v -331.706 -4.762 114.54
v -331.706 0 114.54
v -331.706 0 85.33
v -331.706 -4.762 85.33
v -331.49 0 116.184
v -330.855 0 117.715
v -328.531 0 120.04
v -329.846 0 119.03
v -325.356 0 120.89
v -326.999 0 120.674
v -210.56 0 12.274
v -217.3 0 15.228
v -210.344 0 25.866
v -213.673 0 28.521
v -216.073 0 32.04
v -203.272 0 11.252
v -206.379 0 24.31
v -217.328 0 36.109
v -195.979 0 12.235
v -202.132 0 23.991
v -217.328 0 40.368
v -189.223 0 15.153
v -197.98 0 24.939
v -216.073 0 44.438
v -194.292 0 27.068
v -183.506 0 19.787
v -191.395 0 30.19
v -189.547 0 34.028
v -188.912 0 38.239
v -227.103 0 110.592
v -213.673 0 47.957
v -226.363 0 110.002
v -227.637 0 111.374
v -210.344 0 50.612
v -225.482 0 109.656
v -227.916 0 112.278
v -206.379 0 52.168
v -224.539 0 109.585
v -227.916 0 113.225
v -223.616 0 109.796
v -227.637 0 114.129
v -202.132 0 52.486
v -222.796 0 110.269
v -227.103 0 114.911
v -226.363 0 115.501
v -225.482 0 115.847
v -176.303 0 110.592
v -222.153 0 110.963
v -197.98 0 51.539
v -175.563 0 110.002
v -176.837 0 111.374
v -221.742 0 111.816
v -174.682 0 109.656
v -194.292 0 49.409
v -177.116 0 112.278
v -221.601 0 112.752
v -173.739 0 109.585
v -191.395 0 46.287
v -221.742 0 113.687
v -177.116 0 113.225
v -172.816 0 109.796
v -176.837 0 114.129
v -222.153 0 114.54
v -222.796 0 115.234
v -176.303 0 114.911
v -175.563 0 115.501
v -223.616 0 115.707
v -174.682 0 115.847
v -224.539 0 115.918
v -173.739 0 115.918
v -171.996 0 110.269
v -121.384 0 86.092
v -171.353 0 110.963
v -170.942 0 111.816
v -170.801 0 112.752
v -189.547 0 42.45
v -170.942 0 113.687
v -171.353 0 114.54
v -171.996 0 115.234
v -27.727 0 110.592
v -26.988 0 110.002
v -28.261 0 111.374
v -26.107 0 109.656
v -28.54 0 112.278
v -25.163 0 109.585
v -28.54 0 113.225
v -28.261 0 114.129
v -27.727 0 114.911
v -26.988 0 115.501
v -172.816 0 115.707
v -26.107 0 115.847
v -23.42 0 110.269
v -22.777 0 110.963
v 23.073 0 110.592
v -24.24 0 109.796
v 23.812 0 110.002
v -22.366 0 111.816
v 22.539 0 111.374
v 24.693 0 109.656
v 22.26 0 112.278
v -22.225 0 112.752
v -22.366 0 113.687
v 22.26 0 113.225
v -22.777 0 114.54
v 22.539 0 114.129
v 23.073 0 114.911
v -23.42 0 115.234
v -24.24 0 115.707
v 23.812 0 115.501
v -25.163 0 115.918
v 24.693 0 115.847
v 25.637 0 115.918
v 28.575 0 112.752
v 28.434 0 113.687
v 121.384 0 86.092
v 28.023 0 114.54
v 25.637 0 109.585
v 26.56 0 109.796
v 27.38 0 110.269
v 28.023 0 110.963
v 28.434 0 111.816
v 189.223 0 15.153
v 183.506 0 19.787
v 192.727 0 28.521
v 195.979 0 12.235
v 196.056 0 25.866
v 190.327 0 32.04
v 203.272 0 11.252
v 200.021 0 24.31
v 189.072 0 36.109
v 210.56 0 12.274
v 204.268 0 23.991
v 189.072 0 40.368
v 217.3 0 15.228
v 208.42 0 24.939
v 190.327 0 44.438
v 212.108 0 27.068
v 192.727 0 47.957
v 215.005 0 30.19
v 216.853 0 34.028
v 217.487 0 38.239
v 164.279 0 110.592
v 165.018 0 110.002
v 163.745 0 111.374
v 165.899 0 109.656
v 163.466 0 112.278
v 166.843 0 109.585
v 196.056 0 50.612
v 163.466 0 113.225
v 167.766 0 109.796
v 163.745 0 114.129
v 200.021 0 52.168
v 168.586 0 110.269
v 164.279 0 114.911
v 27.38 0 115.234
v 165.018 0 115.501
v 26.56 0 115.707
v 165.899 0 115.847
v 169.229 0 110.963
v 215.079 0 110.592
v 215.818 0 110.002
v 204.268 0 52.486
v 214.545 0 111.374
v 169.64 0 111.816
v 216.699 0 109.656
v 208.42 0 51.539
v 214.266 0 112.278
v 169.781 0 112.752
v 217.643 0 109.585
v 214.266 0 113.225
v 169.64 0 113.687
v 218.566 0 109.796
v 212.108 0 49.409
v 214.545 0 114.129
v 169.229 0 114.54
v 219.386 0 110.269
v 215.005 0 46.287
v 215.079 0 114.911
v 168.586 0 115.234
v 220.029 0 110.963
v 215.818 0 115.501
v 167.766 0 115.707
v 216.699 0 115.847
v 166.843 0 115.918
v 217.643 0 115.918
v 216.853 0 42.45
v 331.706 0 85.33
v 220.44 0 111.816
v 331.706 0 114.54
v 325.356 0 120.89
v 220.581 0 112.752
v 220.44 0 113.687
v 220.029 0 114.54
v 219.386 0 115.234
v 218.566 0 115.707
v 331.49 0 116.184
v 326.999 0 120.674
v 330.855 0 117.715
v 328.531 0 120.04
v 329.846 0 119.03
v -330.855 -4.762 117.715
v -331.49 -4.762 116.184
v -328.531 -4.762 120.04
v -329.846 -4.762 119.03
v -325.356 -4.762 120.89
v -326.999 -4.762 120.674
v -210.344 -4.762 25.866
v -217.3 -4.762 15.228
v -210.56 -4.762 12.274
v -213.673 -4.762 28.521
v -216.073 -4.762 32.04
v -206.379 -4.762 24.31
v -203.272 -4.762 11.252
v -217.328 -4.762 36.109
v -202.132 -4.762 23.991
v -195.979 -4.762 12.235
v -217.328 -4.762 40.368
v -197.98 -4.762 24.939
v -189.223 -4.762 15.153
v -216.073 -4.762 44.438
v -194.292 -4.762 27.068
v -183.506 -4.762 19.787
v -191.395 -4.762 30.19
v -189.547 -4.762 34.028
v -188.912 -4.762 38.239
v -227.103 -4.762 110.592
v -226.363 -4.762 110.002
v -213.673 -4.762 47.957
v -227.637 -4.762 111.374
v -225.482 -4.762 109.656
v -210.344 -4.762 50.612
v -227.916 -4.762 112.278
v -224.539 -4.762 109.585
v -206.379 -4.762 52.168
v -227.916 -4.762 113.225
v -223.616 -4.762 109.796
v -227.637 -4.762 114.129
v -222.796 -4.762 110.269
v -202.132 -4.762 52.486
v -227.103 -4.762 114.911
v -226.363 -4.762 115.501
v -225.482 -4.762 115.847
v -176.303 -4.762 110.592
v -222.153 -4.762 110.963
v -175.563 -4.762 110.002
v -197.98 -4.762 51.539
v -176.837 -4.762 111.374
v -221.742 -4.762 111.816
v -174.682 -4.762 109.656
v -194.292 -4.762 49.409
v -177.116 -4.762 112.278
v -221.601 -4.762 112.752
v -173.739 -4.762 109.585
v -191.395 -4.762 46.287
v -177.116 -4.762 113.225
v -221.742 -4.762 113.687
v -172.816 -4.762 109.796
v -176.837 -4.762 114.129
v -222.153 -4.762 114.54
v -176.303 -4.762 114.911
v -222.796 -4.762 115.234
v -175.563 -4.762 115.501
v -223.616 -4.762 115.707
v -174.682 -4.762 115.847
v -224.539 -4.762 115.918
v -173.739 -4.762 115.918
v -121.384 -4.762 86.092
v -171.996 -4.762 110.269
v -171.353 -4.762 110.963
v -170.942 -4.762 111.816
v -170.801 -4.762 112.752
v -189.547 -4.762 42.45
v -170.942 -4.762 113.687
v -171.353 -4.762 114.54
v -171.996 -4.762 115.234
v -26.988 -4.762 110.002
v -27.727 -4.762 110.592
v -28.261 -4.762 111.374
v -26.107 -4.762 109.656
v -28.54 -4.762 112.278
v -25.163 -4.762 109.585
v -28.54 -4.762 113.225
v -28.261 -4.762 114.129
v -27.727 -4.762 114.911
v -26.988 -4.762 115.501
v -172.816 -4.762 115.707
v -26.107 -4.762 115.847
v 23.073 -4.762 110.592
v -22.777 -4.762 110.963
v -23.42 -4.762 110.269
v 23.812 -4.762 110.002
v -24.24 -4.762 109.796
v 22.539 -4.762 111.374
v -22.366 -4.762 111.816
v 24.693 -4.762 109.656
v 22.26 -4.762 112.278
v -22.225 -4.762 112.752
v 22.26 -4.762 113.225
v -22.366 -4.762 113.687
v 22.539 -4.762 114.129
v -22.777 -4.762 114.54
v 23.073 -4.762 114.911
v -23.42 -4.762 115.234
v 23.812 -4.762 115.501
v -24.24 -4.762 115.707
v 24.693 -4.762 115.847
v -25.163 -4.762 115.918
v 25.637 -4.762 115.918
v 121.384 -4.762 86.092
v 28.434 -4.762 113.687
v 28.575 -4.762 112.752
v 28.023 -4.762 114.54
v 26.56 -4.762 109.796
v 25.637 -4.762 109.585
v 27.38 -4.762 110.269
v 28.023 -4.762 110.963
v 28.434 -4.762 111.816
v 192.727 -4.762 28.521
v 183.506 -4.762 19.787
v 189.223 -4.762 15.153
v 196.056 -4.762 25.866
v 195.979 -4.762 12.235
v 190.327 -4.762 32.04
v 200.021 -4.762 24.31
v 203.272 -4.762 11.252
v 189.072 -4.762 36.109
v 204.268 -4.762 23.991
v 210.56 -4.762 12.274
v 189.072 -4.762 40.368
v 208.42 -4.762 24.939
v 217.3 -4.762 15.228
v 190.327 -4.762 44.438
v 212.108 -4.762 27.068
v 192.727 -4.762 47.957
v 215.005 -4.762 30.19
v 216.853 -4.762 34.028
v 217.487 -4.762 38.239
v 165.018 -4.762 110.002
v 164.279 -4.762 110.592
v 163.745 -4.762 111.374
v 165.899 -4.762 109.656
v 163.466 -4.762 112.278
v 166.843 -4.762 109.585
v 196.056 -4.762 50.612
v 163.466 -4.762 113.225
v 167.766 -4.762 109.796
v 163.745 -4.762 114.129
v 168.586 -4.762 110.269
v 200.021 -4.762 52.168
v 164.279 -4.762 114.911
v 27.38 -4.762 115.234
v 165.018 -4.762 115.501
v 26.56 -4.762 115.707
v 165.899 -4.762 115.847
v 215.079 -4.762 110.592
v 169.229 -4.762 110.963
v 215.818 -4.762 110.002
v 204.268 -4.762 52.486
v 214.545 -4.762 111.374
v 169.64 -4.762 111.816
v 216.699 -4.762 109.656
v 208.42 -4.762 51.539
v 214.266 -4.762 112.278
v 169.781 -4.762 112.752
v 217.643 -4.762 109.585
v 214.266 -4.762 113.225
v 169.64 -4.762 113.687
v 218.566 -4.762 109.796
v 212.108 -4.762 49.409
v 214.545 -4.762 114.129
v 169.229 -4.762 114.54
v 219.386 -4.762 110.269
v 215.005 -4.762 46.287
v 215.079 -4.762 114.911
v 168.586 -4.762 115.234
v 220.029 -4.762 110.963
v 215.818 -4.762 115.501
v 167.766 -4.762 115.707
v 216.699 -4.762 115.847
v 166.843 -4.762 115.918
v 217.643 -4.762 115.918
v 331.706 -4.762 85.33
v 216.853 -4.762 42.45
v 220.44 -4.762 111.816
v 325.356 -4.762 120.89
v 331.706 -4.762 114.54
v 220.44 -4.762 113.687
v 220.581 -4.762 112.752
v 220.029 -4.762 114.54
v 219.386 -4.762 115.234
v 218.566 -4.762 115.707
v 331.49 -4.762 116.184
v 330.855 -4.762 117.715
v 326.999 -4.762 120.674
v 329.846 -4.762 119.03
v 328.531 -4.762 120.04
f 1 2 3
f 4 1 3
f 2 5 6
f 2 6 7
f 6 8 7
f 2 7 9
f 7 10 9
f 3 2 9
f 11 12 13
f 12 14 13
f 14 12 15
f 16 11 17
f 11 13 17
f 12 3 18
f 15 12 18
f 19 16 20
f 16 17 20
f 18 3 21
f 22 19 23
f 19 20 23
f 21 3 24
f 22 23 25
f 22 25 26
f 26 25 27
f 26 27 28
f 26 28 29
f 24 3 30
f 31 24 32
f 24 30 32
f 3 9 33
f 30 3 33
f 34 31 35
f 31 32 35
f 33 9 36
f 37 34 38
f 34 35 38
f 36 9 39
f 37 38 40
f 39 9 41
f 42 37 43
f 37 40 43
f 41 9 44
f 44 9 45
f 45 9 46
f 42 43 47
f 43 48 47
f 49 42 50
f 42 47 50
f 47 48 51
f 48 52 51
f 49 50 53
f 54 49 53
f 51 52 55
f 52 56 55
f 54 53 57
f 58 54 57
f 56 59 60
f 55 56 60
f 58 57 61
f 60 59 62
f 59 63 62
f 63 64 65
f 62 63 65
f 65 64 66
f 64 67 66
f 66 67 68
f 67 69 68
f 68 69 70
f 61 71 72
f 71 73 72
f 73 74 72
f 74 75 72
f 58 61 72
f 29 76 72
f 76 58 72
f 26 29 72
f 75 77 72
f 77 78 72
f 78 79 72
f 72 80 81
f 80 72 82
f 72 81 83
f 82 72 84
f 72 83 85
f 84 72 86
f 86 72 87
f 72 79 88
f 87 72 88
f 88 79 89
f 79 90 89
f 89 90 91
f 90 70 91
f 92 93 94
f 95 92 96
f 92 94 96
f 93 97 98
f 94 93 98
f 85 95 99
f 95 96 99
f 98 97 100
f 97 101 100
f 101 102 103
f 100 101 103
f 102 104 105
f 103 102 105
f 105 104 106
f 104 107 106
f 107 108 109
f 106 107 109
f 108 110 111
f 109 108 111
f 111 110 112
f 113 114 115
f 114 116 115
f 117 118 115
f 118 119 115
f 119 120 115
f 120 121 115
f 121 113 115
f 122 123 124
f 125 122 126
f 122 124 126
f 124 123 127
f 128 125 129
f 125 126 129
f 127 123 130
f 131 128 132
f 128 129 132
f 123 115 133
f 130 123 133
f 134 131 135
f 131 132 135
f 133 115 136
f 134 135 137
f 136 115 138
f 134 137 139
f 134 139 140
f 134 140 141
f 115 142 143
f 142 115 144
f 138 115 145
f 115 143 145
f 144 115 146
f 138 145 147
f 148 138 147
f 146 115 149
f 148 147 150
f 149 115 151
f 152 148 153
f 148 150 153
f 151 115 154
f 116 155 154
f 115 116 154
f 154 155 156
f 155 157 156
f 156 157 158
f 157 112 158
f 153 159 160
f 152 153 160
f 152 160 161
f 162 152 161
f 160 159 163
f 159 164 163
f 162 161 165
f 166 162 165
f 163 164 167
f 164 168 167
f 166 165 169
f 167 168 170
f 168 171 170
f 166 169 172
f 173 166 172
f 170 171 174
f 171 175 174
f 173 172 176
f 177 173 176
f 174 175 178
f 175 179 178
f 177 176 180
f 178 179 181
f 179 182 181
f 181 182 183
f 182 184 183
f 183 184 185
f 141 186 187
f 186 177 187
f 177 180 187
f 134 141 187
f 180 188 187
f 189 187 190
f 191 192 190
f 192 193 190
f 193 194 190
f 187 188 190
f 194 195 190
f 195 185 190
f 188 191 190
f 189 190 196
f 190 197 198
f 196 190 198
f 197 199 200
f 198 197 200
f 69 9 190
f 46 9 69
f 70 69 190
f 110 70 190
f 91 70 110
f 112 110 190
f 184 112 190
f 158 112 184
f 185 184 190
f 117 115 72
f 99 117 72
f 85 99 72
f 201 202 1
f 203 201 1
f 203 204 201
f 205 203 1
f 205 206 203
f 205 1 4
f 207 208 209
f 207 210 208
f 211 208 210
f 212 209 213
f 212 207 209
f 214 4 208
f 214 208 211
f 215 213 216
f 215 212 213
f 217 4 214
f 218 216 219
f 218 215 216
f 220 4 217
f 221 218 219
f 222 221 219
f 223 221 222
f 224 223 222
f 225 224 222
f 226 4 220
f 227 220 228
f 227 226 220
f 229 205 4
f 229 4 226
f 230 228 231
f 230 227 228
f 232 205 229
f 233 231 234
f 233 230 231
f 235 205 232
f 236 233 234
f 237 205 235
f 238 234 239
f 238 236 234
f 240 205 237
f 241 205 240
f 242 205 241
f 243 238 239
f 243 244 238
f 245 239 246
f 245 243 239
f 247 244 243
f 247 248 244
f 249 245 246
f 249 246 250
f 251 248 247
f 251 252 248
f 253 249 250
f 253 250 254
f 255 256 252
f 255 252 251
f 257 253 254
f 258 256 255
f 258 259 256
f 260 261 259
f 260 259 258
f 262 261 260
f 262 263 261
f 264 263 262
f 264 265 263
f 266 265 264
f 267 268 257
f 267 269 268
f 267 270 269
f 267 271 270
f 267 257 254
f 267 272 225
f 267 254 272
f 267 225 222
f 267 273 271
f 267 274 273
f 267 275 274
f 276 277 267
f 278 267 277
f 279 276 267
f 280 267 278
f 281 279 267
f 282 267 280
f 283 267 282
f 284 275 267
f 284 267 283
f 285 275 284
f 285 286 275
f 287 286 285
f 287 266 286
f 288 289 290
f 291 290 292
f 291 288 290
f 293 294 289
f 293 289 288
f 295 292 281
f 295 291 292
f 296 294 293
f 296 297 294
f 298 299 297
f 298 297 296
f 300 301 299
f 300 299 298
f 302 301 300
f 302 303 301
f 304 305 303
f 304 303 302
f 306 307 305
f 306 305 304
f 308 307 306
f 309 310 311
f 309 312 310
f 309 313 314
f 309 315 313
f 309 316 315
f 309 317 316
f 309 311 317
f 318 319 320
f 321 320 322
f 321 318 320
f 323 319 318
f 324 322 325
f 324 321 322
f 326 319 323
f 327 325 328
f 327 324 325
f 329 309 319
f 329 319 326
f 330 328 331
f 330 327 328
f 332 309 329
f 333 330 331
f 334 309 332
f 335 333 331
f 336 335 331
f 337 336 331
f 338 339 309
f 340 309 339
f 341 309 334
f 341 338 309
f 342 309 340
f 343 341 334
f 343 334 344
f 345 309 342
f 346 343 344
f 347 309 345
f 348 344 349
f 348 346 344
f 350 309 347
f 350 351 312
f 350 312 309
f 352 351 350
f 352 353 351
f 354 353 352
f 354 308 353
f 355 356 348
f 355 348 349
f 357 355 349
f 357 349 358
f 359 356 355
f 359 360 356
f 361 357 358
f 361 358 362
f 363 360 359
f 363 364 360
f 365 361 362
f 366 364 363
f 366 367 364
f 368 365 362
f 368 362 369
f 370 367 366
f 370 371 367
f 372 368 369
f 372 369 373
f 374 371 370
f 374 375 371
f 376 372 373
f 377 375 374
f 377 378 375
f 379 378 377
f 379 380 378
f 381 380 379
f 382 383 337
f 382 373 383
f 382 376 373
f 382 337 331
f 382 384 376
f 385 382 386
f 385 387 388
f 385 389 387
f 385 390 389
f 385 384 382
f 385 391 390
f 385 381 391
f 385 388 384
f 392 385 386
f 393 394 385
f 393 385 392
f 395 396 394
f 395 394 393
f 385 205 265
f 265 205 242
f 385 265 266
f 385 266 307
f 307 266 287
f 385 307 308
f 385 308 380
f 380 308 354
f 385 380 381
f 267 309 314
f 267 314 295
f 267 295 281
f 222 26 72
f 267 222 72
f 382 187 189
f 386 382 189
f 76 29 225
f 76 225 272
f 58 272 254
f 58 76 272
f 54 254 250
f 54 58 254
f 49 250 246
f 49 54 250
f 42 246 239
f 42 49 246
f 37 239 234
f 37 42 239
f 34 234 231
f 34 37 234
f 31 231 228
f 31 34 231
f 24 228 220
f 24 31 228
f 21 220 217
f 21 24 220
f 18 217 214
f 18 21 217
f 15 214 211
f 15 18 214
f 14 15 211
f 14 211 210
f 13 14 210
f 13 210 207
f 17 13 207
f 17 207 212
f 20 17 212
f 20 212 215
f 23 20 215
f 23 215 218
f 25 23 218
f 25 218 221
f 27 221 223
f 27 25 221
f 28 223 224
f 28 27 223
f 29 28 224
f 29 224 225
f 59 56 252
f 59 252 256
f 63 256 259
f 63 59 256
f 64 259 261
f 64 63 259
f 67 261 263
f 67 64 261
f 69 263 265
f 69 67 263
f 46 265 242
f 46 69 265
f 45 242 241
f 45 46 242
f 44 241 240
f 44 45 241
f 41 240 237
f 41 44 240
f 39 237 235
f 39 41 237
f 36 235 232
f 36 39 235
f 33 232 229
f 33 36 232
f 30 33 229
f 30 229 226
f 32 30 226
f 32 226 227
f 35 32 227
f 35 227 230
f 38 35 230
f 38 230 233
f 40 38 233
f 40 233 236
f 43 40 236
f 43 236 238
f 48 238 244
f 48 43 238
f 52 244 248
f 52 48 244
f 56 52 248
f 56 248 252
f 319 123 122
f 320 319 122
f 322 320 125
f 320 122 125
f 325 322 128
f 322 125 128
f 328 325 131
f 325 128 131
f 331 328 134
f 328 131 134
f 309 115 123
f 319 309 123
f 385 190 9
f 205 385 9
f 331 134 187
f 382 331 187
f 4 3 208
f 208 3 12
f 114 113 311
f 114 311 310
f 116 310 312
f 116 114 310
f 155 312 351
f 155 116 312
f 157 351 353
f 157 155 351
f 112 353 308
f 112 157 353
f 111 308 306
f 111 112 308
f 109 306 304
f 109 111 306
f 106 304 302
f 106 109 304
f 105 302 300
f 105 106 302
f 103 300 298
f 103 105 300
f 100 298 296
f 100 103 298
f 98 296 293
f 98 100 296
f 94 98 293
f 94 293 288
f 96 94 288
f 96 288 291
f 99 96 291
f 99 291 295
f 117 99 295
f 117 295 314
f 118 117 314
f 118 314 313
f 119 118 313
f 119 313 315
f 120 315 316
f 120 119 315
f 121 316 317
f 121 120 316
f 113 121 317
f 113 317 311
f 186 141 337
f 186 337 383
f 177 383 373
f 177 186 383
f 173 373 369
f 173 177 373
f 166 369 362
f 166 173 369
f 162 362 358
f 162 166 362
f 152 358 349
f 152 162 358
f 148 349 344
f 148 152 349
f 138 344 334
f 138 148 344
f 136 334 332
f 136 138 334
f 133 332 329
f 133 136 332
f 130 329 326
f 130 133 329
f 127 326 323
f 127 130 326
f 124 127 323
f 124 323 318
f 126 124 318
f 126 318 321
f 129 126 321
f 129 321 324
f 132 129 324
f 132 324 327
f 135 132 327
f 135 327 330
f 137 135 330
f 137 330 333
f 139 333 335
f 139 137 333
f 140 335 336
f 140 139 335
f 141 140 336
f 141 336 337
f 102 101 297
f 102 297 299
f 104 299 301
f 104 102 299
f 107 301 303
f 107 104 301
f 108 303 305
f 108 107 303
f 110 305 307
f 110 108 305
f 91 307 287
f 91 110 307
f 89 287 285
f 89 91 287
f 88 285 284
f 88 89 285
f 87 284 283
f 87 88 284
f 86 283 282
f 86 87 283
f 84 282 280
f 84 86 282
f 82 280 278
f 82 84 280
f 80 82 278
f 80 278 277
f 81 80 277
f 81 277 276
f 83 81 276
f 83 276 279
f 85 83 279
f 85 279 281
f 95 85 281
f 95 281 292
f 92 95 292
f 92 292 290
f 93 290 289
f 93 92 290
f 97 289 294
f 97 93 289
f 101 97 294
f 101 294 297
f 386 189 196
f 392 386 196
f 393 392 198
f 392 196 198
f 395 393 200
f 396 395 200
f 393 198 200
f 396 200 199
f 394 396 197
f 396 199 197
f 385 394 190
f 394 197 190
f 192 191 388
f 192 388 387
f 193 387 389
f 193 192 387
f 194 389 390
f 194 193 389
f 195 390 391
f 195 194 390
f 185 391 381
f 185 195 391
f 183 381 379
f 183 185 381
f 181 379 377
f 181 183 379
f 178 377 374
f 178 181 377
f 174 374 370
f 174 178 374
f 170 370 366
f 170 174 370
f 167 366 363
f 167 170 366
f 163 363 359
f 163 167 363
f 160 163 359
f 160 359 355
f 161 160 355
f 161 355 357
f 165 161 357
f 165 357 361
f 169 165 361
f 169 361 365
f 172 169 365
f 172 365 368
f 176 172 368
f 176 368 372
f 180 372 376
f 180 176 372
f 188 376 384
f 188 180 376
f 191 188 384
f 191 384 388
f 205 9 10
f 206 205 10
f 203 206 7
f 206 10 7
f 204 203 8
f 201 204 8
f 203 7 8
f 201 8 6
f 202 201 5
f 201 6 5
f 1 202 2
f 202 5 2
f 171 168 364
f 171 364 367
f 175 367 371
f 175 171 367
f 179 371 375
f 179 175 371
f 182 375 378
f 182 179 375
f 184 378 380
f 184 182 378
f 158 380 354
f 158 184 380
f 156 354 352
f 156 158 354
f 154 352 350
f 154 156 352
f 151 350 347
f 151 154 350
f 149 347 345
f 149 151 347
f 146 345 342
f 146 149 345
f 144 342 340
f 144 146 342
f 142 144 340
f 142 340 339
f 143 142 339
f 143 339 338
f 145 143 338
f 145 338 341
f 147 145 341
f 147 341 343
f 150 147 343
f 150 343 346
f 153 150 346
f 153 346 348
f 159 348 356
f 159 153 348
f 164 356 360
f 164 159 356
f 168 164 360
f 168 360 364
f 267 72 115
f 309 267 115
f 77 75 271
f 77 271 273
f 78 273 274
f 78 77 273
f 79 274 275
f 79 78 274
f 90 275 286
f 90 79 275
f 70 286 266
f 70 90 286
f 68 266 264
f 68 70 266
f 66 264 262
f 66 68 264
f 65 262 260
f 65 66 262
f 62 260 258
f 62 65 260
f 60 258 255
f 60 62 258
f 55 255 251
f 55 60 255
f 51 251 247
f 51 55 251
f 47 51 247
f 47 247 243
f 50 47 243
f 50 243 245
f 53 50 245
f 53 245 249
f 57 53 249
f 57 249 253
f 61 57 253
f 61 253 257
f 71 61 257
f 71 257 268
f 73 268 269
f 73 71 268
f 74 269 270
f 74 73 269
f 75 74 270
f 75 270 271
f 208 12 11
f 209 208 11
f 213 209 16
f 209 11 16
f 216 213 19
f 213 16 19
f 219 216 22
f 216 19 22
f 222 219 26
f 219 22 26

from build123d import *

# Parameters (mm, degrees)
F0_R     = 14.2875
F0_R_2   = 3.175
F1_DEPTH = 4.7625


# Not quite as in the source:
# - a feature names something its author has since deleted; it is built from what else it names


with BuildPart() as f1:
    # F0 (on Front) → F1 (new body)
    with BuildSketch(Plane.XZ):
        with BuildLine():
            Line((217.3001338382, 15.2277942336), (331.7059490892, 85.3303231618))
            Line((331.7059490892, 85.3303231618), (331.7059490892, 114.5403231618))
            ThreePointArc((331.7059490892, 114.5403231618), (329.8460771498, 119.0304512224), (325.3559490892, 120.8903231618))
            Line((325.3559490892, 120.8903231618), (0, 120.8903231618))
            Line((0, 120.8903231618), (-325.3559490892, 120.8903231618))
            ThreePointArc((-325.3559490892, 120.8903231618), (-329.8460771498, 119.0304512224), (-331.7059490892, 114.5403231618))
            Line((-331.7059490892, 114.5403231618), (-331.7059490892, 85.3303231618))
            Line((-331.7059490892, 85.3303231618), (-217.3001338382, 15.2277942336))
            ThreePointArc((-217.3001338382, 15.2277942336), (-199.5915875984, 11.4937311101), (-183.5057841229, 19.7872685874))
            Line((-183.5057841229, 19.7872685874), (-121.3841438293, 86.0923231618))
            Line((-121.3841438293, 86.0923231618), (0, 86.0923231618))
            Line((0, 86.0923231618), (121.3841438293, 86.0923231618))
            Line((121.3841438293, 86.0923231618), (183.5057841229, 19.7872685874))
            ThreePointArc((183.5057841229, 19.7872685874), (199.5915875984, 11.4937311101), (217.3001338382, 15.2277942336))
        make_face()
        with Locations((-203.2, 38.2389085481)):
            Circle(F0_R, mode=Mode.SUBTRACT)
        with Locations((203.2, 38.2389085481)):
            Circle(F0_R, mode=Mode.SUBTRACT)
        with Locations((-224.77598496, 112.7515938063)):
            Circle(F0_R_2, mode=Mode.SUBTRACT)
        with Locations((-173.97598496, 112.7515938063)):
            Circle(F0_R_2, mode=Mode.SUBTRACT)
        with Locations((-25.4, 112.7515938063)):
            Circle(F0_R_2, mode=Mode.SUBTRACT)
        with Locations((25.4, 112.7515938063)):
            Circle(F0_R_2, mode=Mode.SUBTRACT)
        with Locations((166.6059490892, 112.7515938063)):
            Circle(F0_R_2, mode=Mode.SUBTRACT)
        with Locations((217.4059490892, 112.7515938063)):
            Circle(F0_R_2, mode=Mode.SUBTRACT)
    extrude(amount=F1_DEPTH)


solid = f1.part
